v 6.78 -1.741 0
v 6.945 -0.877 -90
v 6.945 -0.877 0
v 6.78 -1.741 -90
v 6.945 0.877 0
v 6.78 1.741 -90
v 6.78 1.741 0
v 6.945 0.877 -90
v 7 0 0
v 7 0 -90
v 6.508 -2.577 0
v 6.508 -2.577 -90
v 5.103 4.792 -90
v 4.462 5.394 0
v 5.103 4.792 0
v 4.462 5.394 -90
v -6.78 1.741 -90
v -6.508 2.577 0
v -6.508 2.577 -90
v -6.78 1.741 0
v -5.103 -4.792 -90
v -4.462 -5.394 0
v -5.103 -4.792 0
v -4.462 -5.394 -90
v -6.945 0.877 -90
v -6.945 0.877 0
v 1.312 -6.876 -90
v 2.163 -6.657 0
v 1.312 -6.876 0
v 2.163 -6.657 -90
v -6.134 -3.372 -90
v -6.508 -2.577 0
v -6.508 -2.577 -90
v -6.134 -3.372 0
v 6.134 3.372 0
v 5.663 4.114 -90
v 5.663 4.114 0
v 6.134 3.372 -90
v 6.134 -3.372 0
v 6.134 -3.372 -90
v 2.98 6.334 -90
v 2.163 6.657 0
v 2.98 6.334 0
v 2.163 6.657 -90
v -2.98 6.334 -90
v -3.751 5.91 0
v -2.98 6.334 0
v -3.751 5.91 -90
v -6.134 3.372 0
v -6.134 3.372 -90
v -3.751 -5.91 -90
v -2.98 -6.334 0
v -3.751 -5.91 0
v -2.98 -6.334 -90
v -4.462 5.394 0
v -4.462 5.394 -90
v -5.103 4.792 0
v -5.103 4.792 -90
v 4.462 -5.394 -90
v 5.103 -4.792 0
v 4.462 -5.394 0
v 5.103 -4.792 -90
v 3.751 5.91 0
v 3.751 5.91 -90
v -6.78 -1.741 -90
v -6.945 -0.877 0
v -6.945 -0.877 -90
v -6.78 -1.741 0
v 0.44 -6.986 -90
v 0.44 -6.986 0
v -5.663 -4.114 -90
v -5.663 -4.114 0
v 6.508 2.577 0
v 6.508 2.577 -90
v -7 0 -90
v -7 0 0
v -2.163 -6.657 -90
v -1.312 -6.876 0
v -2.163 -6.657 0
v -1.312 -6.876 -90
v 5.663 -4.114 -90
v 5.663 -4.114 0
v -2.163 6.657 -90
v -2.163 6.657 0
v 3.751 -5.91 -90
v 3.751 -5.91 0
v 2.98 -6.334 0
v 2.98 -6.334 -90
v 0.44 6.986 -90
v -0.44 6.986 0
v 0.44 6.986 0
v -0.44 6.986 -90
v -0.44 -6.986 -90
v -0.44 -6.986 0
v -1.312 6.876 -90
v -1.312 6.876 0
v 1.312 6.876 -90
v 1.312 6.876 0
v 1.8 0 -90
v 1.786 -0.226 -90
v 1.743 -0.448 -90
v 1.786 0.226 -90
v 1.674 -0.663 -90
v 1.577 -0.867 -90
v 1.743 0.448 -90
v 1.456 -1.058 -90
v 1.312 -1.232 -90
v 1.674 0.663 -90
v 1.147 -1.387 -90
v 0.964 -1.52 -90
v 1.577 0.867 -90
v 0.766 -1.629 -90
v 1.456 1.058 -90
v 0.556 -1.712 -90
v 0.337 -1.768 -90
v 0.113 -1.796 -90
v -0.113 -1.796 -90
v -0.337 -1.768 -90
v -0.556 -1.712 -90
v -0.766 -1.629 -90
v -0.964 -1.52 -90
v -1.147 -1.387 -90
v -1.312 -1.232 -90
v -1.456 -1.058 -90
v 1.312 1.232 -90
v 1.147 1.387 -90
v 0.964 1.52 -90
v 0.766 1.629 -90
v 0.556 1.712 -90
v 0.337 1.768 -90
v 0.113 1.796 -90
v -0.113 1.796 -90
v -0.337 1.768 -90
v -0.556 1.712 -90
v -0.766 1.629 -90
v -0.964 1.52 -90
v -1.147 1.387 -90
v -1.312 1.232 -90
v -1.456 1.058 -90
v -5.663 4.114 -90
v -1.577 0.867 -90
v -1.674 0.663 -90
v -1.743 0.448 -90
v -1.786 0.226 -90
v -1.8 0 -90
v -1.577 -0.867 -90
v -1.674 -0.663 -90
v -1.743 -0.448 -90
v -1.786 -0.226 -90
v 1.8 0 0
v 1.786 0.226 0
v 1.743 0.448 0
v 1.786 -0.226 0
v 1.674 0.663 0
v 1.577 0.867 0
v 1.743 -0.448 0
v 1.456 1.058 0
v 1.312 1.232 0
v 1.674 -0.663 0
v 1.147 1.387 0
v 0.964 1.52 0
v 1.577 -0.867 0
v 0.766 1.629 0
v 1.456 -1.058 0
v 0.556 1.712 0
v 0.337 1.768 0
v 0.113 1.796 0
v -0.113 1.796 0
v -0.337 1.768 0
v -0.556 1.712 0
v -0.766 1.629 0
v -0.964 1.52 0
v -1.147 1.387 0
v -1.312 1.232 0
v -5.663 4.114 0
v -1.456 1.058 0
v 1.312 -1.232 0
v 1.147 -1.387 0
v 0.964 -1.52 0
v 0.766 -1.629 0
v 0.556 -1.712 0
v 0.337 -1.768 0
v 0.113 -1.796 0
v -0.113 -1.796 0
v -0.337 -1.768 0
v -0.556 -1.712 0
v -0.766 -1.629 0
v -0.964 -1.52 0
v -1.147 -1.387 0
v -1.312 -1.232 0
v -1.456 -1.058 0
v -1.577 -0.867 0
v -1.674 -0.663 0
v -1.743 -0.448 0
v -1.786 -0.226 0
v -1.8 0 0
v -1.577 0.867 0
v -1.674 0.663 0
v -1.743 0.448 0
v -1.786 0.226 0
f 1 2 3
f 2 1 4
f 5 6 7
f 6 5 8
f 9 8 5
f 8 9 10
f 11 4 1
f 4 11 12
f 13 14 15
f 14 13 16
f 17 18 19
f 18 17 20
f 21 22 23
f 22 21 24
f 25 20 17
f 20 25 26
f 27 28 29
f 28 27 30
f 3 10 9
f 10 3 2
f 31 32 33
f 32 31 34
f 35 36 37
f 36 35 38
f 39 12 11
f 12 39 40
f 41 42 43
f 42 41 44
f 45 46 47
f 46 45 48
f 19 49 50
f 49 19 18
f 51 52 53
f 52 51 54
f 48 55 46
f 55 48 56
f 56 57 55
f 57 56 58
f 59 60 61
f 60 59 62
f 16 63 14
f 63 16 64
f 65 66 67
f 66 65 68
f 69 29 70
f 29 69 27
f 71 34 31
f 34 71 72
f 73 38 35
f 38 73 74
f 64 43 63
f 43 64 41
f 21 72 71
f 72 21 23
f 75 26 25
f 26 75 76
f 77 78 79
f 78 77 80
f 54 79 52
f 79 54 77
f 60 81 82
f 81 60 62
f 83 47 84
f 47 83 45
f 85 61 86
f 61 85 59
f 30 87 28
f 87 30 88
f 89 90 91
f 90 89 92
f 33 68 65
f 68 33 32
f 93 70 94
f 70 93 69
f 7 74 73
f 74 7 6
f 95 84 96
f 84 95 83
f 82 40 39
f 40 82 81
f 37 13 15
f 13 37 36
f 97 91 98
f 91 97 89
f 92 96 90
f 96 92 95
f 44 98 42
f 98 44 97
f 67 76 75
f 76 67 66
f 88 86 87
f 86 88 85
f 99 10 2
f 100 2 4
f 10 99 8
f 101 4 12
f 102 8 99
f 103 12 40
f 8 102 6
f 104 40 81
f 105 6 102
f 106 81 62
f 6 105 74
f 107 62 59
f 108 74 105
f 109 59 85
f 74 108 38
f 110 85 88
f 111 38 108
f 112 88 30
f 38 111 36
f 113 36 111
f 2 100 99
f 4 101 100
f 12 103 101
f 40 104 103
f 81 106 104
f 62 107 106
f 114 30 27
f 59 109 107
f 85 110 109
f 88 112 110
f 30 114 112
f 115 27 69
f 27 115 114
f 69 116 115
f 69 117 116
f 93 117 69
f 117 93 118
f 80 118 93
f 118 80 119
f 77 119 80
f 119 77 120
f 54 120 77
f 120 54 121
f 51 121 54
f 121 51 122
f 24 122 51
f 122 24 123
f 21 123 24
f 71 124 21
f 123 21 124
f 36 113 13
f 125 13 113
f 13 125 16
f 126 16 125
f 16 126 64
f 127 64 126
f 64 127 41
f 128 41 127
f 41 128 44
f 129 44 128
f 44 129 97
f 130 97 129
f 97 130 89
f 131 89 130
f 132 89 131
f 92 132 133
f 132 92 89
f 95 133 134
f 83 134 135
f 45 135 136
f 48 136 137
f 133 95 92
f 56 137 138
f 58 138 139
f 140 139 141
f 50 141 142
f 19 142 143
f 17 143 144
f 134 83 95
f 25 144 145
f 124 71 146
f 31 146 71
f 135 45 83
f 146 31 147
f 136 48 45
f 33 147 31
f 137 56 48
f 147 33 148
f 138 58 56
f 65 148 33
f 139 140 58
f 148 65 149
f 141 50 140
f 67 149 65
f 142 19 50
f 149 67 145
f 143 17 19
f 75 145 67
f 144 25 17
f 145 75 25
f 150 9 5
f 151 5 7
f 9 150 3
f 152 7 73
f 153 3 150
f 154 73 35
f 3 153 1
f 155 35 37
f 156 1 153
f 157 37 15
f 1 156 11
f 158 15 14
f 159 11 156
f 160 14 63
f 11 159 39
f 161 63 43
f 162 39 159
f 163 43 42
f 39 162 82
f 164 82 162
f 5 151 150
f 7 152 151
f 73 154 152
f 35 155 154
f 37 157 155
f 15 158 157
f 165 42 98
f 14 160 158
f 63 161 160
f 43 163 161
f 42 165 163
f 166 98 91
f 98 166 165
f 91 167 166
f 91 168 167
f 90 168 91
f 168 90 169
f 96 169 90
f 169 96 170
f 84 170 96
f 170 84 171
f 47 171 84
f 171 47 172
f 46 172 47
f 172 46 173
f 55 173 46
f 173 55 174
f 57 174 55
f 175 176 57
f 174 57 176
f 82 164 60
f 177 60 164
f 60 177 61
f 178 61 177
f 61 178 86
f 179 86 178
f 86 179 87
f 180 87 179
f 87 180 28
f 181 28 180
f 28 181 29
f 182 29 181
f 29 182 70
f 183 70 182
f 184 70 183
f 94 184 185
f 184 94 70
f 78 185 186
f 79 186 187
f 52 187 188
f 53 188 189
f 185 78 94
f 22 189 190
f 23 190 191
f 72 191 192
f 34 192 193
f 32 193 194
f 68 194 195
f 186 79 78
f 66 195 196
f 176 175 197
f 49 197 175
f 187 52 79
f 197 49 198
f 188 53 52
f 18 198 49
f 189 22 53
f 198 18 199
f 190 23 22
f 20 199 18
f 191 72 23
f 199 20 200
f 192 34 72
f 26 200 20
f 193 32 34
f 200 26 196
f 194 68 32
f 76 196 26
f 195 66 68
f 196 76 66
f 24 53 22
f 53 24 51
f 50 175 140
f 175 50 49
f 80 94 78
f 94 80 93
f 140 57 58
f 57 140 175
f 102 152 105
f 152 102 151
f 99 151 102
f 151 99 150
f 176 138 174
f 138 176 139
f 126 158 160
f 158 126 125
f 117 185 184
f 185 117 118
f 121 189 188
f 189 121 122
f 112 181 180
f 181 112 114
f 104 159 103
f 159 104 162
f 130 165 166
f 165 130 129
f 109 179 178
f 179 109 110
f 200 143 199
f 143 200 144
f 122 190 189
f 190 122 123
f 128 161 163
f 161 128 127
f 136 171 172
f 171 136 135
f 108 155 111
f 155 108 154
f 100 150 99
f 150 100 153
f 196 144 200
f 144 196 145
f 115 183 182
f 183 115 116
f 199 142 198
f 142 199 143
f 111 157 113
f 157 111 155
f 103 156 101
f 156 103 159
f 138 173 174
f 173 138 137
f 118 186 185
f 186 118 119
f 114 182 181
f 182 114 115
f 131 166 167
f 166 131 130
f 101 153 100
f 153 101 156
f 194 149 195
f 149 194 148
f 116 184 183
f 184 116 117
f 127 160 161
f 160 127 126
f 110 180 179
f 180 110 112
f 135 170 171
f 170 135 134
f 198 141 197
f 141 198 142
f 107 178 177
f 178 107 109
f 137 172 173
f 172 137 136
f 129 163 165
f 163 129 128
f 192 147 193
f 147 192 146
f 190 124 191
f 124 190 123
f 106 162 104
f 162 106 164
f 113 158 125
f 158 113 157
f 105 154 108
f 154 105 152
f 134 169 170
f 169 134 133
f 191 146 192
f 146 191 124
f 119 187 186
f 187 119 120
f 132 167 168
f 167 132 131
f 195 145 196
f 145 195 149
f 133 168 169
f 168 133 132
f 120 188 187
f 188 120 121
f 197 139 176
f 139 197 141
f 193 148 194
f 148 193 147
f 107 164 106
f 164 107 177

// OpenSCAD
$fn = 50;


difference() {
	union() {
		translate(v = [0, 0, -90.0000000000]) {
			cylinder(h = 90, r = 7.0000000000);
		}
	}
	union() {
		#translate(v = [0, 0, -90]) {
			cylinder(h = 90, r = 1.8000000000);
		}
	}
}
